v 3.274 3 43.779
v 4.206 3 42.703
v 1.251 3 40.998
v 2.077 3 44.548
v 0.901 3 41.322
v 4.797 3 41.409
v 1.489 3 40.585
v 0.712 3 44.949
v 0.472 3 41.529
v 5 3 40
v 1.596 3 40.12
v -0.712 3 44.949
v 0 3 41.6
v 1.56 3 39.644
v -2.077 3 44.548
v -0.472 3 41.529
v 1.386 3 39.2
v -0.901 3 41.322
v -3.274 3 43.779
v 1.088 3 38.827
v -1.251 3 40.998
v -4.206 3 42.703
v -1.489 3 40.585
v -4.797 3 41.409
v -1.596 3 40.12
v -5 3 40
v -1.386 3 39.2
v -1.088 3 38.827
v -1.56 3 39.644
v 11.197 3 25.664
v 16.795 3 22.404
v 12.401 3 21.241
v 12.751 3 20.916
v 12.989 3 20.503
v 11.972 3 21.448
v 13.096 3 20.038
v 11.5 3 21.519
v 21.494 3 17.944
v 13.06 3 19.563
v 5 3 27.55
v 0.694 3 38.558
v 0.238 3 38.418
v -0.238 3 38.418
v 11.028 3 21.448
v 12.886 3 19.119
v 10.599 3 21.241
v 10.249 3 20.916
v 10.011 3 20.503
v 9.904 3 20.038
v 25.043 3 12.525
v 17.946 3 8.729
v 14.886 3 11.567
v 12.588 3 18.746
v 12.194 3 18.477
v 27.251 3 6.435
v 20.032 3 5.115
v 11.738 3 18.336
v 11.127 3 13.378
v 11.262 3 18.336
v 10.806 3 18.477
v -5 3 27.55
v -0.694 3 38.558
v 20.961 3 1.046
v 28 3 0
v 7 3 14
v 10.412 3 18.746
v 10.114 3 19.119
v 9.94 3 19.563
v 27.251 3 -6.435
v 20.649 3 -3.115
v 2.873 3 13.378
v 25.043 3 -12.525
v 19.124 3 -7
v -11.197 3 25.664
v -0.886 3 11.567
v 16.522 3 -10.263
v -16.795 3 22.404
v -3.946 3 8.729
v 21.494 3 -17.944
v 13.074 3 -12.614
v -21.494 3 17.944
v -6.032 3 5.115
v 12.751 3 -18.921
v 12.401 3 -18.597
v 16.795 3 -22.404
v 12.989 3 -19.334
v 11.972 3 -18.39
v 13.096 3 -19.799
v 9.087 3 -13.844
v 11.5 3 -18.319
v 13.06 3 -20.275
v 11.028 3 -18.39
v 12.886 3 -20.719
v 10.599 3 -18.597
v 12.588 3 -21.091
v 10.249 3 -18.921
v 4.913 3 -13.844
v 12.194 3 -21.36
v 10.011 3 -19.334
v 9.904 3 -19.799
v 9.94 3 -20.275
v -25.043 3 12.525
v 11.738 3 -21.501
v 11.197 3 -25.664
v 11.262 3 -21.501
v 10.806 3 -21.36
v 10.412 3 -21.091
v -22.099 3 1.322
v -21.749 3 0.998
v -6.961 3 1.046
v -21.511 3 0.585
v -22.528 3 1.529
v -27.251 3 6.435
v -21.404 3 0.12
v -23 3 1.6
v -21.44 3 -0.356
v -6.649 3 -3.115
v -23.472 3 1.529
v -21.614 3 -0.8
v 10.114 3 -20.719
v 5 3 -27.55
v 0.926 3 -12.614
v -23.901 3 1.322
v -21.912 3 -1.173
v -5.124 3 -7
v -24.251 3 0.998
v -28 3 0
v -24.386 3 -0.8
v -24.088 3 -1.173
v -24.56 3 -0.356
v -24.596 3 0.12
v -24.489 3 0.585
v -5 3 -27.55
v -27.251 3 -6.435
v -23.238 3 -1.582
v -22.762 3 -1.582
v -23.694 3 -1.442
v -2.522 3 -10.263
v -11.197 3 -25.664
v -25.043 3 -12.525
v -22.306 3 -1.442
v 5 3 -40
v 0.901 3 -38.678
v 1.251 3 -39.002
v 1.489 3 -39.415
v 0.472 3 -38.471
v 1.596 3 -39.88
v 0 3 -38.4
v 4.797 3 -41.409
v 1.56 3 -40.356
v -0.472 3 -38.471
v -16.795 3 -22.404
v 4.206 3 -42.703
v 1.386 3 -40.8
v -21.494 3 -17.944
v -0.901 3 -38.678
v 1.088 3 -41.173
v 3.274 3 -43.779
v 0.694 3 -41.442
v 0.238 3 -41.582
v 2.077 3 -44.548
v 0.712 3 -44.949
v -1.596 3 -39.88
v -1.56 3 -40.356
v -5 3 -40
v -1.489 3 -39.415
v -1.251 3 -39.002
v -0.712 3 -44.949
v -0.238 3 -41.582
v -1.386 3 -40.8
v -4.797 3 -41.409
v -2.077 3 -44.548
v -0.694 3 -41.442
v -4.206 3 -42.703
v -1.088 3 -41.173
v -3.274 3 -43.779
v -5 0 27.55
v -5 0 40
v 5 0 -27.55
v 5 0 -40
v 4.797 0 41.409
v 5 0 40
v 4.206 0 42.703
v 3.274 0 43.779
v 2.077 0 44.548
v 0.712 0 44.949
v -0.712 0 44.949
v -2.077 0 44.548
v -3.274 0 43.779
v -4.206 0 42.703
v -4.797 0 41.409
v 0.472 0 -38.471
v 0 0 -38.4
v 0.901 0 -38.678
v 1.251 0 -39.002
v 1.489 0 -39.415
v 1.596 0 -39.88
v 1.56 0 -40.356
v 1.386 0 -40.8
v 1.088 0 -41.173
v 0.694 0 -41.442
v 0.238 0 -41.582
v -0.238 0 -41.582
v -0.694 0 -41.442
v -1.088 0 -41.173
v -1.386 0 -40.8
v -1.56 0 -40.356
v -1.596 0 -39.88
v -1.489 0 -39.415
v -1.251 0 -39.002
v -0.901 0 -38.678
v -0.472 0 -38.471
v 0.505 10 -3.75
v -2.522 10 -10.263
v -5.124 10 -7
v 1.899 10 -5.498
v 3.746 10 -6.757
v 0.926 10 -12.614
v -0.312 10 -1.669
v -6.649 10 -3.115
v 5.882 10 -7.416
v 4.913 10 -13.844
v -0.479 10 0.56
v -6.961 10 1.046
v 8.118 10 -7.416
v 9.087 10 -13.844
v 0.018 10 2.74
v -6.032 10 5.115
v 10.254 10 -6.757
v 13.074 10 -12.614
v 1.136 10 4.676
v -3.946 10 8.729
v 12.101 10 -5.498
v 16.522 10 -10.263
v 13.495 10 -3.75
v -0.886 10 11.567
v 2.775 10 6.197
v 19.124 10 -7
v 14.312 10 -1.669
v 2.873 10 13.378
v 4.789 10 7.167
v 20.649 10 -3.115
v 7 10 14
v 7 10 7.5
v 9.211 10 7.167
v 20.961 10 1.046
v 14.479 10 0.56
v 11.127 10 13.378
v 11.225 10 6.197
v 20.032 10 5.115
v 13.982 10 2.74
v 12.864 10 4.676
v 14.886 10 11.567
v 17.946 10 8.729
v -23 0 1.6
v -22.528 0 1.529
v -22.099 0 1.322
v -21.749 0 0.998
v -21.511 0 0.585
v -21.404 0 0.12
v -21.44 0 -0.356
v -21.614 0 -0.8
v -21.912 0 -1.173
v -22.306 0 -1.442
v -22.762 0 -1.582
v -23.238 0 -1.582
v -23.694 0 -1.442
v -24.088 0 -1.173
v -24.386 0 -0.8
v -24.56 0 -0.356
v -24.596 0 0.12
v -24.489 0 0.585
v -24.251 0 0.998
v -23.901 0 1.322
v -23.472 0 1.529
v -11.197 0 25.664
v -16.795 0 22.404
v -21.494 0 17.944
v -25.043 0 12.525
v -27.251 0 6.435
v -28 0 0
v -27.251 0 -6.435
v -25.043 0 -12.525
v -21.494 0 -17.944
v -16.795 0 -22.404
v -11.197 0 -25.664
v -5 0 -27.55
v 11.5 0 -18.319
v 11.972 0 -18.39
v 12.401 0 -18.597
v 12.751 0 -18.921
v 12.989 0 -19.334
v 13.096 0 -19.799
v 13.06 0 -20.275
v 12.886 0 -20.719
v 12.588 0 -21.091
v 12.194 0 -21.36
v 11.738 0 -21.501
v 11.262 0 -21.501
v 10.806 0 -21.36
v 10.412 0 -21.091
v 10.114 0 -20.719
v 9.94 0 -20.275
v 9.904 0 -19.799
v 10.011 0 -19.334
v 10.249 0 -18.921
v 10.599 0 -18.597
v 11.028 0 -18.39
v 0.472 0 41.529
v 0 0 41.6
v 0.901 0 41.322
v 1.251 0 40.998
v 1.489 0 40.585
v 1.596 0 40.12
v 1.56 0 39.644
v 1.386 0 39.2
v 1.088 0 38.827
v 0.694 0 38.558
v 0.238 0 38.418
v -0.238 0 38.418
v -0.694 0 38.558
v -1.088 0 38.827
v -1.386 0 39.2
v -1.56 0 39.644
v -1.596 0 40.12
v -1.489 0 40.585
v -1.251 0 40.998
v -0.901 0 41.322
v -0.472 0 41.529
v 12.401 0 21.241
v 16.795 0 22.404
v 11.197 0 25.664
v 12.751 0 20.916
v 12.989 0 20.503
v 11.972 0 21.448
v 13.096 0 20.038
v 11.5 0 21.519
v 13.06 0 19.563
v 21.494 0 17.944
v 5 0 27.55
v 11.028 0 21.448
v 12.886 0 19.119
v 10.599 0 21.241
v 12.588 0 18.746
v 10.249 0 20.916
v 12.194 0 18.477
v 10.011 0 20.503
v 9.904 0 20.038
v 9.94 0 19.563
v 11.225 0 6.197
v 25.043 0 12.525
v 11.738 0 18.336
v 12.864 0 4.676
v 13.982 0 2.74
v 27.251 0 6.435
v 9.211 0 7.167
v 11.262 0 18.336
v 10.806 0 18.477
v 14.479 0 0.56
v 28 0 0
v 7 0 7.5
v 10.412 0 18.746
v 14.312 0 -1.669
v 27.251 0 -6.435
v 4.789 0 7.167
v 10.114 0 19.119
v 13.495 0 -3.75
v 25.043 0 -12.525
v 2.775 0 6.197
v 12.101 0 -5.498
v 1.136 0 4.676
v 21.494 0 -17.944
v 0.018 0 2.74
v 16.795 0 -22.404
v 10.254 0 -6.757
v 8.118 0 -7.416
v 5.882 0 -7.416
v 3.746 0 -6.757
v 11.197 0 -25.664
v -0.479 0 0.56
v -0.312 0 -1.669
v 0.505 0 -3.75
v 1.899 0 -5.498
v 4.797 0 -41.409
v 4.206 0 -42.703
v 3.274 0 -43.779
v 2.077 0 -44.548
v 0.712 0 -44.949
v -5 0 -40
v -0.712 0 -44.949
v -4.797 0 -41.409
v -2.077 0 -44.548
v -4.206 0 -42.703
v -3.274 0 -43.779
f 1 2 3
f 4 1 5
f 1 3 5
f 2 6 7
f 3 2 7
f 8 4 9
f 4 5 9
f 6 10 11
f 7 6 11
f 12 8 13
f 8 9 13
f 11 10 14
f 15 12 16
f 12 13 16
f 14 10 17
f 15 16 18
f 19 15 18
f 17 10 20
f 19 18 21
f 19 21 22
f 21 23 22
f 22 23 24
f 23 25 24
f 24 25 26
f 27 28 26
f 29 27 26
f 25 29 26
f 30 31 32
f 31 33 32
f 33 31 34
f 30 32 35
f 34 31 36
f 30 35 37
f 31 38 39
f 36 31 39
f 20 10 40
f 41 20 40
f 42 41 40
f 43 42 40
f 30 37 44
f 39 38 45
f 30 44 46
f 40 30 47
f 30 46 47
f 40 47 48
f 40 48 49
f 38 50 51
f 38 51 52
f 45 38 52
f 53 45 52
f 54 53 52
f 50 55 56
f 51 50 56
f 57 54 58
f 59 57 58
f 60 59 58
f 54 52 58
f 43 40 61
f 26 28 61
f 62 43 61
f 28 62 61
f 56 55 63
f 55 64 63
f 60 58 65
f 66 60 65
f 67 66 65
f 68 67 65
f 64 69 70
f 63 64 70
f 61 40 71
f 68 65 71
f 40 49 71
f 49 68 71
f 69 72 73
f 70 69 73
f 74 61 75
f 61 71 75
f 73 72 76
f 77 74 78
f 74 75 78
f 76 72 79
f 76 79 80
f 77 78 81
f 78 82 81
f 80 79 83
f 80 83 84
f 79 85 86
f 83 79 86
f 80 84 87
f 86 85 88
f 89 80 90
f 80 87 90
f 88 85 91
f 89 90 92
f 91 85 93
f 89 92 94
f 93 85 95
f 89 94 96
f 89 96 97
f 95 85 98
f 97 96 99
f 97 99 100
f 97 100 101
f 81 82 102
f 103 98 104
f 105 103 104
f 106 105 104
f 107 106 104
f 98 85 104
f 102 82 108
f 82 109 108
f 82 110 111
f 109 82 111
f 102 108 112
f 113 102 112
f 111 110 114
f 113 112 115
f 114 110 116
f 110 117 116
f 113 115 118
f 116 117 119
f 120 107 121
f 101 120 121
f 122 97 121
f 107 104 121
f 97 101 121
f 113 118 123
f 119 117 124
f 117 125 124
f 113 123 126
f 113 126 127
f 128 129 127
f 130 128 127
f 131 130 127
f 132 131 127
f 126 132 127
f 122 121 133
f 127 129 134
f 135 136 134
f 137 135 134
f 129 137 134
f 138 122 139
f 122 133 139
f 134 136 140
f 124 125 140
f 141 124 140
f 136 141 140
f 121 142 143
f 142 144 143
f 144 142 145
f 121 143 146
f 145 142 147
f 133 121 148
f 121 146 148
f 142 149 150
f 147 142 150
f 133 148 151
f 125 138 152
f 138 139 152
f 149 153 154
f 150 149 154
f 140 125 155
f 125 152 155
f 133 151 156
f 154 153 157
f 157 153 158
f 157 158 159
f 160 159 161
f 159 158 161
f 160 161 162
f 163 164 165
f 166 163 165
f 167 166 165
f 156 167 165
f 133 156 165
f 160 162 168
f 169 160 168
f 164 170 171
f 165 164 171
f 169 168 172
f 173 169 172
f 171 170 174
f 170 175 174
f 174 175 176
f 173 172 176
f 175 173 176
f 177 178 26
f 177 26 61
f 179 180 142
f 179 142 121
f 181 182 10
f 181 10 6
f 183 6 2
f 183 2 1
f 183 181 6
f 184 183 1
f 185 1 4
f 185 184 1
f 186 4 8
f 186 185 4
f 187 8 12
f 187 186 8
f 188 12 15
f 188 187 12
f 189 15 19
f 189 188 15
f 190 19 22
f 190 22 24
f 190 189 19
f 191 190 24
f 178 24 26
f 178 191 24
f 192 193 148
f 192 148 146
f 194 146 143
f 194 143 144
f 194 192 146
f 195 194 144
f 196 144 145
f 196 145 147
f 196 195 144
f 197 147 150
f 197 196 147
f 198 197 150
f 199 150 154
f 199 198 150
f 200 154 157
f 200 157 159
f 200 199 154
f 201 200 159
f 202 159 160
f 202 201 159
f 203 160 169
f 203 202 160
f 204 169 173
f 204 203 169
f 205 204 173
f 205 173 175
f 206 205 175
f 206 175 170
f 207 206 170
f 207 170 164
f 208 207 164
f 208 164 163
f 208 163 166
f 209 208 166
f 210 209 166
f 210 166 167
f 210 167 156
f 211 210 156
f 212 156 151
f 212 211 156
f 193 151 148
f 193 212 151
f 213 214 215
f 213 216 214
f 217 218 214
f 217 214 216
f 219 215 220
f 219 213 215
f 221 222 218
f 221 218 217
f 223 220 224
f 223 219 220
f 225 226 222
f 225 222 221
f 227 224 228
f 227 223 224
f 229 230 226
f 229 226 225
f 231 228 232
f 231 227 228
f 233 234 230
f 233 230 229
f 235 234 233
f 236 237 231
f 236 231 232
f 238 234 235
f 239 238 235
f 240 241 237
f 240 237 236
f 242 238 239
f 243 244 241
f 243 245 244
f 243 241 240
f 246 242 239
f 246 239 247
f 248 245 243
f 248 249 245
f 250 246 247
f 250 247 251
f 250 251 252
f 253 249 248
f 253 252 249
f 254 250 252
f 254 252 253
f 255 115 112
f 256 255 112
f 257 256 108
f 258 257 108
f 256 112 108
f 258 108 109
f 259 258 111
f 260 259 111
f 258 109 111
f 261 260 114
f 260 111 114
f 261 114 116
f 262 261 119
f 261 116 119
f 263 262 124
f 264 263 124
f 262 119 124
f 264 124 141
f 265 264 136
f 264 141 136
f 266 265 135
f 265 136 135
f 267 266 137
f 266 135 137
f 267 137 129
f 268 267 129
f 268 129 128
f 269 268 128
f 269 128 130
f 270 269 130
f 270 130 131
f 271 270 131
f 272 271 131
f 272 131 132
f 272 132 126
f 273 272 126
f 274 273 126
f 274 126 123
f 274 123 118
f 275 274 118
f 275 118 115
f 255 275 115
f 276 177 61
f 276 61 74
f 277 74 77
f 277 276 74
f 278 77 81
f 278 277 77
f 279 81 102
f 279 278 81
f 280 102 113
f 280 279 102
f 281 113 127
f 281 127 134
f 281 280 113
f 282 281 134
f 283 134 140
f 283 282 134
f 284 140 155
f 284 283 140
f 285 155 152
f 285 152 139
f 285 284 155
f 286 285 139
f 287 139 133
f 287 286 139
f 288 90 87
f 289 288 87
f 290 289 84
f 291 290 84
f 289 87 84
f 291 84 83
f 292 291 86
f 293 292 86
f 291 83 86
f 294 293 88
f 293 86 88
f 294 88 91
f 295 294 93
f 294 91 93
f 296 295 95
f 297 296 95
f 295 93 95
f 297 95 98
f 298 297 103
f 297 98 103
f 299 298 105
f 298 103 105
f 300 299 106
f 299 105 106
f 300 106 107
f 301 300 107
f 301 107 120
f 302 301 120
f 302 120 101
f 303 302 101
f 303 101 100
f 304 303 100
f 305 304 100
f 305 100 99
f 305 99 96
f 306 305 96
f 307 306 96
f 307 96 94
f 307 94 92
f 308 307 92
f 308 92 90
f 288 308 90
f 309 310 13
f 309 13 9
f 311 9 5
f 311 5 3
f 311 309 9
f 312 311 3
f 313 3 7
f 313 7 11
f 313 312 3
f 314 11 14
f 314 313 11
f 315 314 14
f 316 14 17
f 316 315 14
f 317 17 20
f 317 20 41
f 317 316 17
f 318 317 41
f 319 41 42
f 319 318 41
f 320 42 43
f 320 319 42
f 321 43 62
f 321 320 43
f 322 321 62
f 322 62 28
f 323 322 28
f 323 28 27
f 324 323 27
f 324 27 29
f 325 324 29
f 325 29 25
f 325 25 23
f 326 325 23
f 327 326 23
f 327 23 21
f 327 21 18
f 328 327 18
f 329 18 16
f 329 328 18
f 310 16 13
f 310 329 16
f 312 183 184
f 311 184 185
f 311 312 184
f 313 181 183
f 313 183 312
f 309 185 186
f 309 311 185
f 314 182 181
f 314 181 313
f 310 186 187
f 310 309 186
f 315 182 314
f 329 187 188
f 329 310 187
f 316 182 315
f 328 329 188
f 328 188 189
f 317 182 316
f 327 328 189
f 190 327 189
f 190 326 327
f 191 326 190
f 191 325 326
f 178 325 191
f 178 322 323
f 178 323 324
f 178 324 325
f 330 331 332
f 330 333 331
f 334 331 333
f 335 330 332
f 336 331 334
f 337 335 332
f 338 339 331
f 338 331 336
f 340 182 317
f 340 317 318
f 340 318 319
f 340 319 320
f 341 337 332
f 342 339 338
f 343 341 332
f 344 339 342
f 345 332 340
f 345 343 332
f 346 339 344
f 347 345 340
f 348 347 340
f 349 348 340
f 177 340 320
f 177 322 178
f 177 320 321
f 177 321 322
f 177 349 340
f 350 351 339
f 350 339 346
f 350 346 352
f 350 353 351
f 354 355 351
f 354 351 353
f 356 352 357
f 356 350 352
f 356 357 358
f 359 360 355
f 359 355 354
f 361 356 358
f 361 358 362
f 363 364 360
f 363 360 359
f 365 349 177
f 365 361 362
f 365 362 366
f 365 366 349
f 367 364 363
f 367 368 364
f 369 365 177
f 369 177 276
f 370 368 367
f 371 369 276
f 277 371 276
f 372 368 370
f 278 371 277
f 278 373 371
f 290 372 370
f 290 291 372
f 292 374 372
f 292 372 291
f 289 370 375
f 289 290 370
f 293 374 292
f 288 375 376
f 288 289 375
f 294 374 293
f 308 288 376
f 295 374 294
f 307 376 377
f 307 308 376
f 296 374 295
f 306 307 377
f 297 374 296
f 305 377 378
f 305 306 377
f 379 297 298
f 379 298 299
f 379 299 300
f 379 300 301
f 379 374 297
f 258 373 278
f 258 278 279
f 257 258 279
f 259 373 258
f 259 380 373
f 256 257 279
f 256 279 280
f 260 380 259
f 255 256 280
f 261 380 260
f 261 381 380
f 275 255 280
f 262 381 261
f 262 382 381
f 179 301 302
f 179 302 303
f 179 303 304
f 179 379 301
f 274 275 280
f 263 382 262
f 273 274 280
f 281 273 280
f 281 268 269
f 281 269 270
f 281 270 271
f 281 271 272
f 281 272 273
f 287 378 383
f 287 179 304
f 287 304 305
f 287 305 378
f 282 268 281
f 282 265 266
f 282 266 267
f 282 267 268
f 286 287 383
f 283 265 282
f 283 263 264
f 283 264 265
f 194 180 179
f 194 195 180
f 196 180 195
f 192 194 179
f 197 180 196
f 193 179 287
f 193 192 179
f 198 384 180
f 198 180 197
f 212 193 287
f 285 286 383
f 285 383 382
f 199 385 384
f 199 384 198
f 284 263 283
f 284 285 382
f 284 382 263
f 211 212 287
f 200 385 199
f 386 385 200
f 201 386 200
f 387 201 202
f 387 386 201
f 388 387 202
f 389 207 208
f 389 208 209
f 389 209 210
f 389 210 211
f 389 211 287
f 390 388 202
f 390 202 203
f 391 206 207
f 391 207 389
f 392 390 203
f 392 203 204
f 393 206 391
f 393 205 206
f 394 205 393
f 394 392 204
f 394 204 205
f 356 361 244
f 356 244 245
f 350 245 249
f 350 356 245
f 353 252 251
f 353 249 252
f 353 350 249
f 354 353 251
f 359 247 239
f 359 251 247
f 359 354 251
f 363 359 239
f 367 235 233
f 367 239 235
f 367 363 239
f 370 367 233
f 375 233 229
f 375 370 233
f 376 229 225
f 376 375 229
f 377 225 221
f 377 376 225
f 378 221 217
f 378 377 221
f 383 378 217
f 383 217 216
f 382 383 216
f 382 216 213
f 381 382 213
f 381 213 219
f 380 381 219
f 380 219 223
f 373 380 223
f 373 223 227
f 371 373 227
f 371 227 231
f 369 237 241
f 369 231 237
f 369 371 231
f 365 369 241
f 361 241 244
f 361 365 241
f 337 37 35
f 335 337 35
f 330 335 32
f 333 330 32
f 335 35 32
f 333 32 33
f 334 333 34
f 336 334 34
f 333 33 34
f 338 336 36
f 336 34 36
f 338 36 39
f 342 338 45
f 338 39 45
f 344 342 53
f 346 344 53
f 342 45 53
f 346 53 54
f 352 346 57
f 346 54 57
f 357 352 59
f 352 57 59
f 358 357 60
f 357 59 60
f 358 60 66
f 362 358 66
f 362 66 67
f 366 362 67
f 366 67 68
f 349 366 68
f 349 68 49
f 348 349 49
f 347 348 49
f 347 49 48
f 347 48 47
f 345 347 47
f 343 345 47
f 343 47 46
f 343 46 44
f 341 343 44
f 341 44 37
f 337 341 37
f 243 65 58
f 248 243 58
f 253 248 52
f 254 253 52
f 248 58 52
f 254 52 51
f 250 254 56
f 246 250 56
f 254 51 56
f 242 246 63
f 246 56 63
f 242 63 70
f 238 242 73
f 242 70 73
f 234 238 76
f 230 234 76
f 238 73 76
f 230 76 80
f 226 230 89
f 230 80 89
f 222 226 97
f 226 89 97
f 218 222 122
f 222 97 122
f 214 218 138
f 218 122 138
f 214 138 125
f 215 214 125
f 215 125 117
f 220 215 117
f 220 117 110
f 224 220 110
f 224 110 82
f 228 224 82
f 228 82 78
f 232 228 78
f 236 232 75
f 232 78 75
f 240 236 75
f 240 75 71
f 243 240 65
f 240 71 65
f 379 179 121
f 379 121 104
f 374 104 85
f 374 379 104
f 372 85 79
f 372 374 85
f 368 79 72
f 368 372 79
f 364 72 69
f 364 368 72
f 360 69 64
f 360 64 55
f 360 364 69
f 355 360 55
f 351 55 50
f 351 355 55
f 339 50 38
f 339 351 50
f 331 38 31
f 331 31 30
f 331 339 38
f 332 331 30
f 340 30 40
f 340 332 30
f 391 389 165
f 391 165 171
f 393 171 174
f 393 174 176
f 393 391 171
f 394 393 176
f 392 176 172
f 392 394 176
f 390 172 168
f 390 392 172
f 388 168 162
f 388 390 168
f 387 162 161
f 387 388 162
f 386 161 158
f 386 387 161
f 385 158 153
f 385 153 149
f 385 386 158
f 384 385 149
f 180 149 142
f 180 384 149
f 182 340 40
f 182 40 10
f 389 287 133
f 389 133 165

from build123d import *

# Parameters (mm, degrees)
SKETCH_1_R               = 1.6
EXTRUDE_1_DEPTH          = 3
SKETCH_4_R               = 14
EXTRUDE_2_DEPTH          = 7
CUT_EXTRUDE_1_DEPTH      = 54.460265618
CUT_EXTRUDE_1_DEPTH_BACK = 54.460265618
SKETCH_2_R               = 7.5
SKETCH_3_R               = 1.6
CUT_EXTRUDE_2_DEPTH      = 54.460265618


with BuildPart() as part:
    # ｽｹｯﾁ1 → ﾎﾞｽ - 押し出し1 (new body)
    with BuildSketch(Plane(origin=(0, 0, 0), x_dir=(1, 0, 0), z_dir=(0, 1, 0))):
        with BuildLine():
            Line((5, 40), (5, 27.549954628))
            ThreePointArc((5, 27.549954628), (28, 0), (5, -27.549954628))
            Line((5, -27.549954628), (5, -40))
            ThreePointArc((5, -40), (0, -45), (-5, -40))
            Line((-5, -40), (-5, -27.549954628))
            ThreePointArc((-5, -27.549954628), (-28, 0), (-5, 27.549954628))
            Line((-5, 27.549954628), (-5, 40))
            ThreePointArc((-5, 40), (0, 45), (5, 40))
        make_face()
        with Locations(Location((0, 40, 0), (0, 0, 270))):
            Circle(SKETCH_1_R, mode=Mode.SUBTRACT)
        with Locations(Location((0, -40, 0), (0, 0, 270))):
            Circle(SKETCH_1_R, mode=Mode.SUBTRACT)
    extrude(amount=EXTRUDE_1_DEPTH)

    # ｽｹｯﾁ4 → ﾎﾞｽ - 押し出し2 (add)
    with BuildSketch(Plane(origin=(0, 3, 0), x_dir=(1, 0, 0), z_dir=(0, 1, 0))):
        with Locations(Location((7, 0, 0), (0, 0, 270))):
            Circle(SKETCH_4_R)
    extrude(amount=EXTRUDE_2_DEPTH)

    # ｽｹｯﾁ2 → ｶｯﾄ - 押し出し1 (cut, two sides: drawn at the far end of the back side and taken through both)
    with BuildSketch(Plane(origin=(0, 3, 0), x_dir=(1, 0, 0), z_dir=(0, 1, 0)).offset(-CUT_EXTRUDE_1_DEPTH_BACK)):
        with Locations(Location((7, 0, 0), (0, 0, 270))):
            Circle(SKETCH_2_R)
    extrude(amount=CUT_EXTRUDE_1_DEPTH + CUT_EXTRUDE_1_DEPTH_BACK, mode=Mode.SUBTRACT)

    # ｽｹｯﾁ3 → ｶｯﾄ - 押し出し2 (cut, through all)
    with BuildSketch(Plane(origin=(0, 3, 0), x_dir=(1, 0, 0), z_dir=(0, 1, 0))):
        with Locations(Location((-23, 0, 0), (0, 0, 270))):
            Circle(SKETCH_3_R)
        with Locations(Location((11.5, 19.918584287, 0), (0, 0, 270))):
            Circle(SKETCH_3_R)
        with Locations(Location((11.5, -19.918584287, 0), (0, 0, 270))):
            Circle(SKETCH_3_R)
    extrude(amount=-CUT_EXTRUDE_2_DEPTH, mode=Mode.SUBTRACT)


solid = part.part
